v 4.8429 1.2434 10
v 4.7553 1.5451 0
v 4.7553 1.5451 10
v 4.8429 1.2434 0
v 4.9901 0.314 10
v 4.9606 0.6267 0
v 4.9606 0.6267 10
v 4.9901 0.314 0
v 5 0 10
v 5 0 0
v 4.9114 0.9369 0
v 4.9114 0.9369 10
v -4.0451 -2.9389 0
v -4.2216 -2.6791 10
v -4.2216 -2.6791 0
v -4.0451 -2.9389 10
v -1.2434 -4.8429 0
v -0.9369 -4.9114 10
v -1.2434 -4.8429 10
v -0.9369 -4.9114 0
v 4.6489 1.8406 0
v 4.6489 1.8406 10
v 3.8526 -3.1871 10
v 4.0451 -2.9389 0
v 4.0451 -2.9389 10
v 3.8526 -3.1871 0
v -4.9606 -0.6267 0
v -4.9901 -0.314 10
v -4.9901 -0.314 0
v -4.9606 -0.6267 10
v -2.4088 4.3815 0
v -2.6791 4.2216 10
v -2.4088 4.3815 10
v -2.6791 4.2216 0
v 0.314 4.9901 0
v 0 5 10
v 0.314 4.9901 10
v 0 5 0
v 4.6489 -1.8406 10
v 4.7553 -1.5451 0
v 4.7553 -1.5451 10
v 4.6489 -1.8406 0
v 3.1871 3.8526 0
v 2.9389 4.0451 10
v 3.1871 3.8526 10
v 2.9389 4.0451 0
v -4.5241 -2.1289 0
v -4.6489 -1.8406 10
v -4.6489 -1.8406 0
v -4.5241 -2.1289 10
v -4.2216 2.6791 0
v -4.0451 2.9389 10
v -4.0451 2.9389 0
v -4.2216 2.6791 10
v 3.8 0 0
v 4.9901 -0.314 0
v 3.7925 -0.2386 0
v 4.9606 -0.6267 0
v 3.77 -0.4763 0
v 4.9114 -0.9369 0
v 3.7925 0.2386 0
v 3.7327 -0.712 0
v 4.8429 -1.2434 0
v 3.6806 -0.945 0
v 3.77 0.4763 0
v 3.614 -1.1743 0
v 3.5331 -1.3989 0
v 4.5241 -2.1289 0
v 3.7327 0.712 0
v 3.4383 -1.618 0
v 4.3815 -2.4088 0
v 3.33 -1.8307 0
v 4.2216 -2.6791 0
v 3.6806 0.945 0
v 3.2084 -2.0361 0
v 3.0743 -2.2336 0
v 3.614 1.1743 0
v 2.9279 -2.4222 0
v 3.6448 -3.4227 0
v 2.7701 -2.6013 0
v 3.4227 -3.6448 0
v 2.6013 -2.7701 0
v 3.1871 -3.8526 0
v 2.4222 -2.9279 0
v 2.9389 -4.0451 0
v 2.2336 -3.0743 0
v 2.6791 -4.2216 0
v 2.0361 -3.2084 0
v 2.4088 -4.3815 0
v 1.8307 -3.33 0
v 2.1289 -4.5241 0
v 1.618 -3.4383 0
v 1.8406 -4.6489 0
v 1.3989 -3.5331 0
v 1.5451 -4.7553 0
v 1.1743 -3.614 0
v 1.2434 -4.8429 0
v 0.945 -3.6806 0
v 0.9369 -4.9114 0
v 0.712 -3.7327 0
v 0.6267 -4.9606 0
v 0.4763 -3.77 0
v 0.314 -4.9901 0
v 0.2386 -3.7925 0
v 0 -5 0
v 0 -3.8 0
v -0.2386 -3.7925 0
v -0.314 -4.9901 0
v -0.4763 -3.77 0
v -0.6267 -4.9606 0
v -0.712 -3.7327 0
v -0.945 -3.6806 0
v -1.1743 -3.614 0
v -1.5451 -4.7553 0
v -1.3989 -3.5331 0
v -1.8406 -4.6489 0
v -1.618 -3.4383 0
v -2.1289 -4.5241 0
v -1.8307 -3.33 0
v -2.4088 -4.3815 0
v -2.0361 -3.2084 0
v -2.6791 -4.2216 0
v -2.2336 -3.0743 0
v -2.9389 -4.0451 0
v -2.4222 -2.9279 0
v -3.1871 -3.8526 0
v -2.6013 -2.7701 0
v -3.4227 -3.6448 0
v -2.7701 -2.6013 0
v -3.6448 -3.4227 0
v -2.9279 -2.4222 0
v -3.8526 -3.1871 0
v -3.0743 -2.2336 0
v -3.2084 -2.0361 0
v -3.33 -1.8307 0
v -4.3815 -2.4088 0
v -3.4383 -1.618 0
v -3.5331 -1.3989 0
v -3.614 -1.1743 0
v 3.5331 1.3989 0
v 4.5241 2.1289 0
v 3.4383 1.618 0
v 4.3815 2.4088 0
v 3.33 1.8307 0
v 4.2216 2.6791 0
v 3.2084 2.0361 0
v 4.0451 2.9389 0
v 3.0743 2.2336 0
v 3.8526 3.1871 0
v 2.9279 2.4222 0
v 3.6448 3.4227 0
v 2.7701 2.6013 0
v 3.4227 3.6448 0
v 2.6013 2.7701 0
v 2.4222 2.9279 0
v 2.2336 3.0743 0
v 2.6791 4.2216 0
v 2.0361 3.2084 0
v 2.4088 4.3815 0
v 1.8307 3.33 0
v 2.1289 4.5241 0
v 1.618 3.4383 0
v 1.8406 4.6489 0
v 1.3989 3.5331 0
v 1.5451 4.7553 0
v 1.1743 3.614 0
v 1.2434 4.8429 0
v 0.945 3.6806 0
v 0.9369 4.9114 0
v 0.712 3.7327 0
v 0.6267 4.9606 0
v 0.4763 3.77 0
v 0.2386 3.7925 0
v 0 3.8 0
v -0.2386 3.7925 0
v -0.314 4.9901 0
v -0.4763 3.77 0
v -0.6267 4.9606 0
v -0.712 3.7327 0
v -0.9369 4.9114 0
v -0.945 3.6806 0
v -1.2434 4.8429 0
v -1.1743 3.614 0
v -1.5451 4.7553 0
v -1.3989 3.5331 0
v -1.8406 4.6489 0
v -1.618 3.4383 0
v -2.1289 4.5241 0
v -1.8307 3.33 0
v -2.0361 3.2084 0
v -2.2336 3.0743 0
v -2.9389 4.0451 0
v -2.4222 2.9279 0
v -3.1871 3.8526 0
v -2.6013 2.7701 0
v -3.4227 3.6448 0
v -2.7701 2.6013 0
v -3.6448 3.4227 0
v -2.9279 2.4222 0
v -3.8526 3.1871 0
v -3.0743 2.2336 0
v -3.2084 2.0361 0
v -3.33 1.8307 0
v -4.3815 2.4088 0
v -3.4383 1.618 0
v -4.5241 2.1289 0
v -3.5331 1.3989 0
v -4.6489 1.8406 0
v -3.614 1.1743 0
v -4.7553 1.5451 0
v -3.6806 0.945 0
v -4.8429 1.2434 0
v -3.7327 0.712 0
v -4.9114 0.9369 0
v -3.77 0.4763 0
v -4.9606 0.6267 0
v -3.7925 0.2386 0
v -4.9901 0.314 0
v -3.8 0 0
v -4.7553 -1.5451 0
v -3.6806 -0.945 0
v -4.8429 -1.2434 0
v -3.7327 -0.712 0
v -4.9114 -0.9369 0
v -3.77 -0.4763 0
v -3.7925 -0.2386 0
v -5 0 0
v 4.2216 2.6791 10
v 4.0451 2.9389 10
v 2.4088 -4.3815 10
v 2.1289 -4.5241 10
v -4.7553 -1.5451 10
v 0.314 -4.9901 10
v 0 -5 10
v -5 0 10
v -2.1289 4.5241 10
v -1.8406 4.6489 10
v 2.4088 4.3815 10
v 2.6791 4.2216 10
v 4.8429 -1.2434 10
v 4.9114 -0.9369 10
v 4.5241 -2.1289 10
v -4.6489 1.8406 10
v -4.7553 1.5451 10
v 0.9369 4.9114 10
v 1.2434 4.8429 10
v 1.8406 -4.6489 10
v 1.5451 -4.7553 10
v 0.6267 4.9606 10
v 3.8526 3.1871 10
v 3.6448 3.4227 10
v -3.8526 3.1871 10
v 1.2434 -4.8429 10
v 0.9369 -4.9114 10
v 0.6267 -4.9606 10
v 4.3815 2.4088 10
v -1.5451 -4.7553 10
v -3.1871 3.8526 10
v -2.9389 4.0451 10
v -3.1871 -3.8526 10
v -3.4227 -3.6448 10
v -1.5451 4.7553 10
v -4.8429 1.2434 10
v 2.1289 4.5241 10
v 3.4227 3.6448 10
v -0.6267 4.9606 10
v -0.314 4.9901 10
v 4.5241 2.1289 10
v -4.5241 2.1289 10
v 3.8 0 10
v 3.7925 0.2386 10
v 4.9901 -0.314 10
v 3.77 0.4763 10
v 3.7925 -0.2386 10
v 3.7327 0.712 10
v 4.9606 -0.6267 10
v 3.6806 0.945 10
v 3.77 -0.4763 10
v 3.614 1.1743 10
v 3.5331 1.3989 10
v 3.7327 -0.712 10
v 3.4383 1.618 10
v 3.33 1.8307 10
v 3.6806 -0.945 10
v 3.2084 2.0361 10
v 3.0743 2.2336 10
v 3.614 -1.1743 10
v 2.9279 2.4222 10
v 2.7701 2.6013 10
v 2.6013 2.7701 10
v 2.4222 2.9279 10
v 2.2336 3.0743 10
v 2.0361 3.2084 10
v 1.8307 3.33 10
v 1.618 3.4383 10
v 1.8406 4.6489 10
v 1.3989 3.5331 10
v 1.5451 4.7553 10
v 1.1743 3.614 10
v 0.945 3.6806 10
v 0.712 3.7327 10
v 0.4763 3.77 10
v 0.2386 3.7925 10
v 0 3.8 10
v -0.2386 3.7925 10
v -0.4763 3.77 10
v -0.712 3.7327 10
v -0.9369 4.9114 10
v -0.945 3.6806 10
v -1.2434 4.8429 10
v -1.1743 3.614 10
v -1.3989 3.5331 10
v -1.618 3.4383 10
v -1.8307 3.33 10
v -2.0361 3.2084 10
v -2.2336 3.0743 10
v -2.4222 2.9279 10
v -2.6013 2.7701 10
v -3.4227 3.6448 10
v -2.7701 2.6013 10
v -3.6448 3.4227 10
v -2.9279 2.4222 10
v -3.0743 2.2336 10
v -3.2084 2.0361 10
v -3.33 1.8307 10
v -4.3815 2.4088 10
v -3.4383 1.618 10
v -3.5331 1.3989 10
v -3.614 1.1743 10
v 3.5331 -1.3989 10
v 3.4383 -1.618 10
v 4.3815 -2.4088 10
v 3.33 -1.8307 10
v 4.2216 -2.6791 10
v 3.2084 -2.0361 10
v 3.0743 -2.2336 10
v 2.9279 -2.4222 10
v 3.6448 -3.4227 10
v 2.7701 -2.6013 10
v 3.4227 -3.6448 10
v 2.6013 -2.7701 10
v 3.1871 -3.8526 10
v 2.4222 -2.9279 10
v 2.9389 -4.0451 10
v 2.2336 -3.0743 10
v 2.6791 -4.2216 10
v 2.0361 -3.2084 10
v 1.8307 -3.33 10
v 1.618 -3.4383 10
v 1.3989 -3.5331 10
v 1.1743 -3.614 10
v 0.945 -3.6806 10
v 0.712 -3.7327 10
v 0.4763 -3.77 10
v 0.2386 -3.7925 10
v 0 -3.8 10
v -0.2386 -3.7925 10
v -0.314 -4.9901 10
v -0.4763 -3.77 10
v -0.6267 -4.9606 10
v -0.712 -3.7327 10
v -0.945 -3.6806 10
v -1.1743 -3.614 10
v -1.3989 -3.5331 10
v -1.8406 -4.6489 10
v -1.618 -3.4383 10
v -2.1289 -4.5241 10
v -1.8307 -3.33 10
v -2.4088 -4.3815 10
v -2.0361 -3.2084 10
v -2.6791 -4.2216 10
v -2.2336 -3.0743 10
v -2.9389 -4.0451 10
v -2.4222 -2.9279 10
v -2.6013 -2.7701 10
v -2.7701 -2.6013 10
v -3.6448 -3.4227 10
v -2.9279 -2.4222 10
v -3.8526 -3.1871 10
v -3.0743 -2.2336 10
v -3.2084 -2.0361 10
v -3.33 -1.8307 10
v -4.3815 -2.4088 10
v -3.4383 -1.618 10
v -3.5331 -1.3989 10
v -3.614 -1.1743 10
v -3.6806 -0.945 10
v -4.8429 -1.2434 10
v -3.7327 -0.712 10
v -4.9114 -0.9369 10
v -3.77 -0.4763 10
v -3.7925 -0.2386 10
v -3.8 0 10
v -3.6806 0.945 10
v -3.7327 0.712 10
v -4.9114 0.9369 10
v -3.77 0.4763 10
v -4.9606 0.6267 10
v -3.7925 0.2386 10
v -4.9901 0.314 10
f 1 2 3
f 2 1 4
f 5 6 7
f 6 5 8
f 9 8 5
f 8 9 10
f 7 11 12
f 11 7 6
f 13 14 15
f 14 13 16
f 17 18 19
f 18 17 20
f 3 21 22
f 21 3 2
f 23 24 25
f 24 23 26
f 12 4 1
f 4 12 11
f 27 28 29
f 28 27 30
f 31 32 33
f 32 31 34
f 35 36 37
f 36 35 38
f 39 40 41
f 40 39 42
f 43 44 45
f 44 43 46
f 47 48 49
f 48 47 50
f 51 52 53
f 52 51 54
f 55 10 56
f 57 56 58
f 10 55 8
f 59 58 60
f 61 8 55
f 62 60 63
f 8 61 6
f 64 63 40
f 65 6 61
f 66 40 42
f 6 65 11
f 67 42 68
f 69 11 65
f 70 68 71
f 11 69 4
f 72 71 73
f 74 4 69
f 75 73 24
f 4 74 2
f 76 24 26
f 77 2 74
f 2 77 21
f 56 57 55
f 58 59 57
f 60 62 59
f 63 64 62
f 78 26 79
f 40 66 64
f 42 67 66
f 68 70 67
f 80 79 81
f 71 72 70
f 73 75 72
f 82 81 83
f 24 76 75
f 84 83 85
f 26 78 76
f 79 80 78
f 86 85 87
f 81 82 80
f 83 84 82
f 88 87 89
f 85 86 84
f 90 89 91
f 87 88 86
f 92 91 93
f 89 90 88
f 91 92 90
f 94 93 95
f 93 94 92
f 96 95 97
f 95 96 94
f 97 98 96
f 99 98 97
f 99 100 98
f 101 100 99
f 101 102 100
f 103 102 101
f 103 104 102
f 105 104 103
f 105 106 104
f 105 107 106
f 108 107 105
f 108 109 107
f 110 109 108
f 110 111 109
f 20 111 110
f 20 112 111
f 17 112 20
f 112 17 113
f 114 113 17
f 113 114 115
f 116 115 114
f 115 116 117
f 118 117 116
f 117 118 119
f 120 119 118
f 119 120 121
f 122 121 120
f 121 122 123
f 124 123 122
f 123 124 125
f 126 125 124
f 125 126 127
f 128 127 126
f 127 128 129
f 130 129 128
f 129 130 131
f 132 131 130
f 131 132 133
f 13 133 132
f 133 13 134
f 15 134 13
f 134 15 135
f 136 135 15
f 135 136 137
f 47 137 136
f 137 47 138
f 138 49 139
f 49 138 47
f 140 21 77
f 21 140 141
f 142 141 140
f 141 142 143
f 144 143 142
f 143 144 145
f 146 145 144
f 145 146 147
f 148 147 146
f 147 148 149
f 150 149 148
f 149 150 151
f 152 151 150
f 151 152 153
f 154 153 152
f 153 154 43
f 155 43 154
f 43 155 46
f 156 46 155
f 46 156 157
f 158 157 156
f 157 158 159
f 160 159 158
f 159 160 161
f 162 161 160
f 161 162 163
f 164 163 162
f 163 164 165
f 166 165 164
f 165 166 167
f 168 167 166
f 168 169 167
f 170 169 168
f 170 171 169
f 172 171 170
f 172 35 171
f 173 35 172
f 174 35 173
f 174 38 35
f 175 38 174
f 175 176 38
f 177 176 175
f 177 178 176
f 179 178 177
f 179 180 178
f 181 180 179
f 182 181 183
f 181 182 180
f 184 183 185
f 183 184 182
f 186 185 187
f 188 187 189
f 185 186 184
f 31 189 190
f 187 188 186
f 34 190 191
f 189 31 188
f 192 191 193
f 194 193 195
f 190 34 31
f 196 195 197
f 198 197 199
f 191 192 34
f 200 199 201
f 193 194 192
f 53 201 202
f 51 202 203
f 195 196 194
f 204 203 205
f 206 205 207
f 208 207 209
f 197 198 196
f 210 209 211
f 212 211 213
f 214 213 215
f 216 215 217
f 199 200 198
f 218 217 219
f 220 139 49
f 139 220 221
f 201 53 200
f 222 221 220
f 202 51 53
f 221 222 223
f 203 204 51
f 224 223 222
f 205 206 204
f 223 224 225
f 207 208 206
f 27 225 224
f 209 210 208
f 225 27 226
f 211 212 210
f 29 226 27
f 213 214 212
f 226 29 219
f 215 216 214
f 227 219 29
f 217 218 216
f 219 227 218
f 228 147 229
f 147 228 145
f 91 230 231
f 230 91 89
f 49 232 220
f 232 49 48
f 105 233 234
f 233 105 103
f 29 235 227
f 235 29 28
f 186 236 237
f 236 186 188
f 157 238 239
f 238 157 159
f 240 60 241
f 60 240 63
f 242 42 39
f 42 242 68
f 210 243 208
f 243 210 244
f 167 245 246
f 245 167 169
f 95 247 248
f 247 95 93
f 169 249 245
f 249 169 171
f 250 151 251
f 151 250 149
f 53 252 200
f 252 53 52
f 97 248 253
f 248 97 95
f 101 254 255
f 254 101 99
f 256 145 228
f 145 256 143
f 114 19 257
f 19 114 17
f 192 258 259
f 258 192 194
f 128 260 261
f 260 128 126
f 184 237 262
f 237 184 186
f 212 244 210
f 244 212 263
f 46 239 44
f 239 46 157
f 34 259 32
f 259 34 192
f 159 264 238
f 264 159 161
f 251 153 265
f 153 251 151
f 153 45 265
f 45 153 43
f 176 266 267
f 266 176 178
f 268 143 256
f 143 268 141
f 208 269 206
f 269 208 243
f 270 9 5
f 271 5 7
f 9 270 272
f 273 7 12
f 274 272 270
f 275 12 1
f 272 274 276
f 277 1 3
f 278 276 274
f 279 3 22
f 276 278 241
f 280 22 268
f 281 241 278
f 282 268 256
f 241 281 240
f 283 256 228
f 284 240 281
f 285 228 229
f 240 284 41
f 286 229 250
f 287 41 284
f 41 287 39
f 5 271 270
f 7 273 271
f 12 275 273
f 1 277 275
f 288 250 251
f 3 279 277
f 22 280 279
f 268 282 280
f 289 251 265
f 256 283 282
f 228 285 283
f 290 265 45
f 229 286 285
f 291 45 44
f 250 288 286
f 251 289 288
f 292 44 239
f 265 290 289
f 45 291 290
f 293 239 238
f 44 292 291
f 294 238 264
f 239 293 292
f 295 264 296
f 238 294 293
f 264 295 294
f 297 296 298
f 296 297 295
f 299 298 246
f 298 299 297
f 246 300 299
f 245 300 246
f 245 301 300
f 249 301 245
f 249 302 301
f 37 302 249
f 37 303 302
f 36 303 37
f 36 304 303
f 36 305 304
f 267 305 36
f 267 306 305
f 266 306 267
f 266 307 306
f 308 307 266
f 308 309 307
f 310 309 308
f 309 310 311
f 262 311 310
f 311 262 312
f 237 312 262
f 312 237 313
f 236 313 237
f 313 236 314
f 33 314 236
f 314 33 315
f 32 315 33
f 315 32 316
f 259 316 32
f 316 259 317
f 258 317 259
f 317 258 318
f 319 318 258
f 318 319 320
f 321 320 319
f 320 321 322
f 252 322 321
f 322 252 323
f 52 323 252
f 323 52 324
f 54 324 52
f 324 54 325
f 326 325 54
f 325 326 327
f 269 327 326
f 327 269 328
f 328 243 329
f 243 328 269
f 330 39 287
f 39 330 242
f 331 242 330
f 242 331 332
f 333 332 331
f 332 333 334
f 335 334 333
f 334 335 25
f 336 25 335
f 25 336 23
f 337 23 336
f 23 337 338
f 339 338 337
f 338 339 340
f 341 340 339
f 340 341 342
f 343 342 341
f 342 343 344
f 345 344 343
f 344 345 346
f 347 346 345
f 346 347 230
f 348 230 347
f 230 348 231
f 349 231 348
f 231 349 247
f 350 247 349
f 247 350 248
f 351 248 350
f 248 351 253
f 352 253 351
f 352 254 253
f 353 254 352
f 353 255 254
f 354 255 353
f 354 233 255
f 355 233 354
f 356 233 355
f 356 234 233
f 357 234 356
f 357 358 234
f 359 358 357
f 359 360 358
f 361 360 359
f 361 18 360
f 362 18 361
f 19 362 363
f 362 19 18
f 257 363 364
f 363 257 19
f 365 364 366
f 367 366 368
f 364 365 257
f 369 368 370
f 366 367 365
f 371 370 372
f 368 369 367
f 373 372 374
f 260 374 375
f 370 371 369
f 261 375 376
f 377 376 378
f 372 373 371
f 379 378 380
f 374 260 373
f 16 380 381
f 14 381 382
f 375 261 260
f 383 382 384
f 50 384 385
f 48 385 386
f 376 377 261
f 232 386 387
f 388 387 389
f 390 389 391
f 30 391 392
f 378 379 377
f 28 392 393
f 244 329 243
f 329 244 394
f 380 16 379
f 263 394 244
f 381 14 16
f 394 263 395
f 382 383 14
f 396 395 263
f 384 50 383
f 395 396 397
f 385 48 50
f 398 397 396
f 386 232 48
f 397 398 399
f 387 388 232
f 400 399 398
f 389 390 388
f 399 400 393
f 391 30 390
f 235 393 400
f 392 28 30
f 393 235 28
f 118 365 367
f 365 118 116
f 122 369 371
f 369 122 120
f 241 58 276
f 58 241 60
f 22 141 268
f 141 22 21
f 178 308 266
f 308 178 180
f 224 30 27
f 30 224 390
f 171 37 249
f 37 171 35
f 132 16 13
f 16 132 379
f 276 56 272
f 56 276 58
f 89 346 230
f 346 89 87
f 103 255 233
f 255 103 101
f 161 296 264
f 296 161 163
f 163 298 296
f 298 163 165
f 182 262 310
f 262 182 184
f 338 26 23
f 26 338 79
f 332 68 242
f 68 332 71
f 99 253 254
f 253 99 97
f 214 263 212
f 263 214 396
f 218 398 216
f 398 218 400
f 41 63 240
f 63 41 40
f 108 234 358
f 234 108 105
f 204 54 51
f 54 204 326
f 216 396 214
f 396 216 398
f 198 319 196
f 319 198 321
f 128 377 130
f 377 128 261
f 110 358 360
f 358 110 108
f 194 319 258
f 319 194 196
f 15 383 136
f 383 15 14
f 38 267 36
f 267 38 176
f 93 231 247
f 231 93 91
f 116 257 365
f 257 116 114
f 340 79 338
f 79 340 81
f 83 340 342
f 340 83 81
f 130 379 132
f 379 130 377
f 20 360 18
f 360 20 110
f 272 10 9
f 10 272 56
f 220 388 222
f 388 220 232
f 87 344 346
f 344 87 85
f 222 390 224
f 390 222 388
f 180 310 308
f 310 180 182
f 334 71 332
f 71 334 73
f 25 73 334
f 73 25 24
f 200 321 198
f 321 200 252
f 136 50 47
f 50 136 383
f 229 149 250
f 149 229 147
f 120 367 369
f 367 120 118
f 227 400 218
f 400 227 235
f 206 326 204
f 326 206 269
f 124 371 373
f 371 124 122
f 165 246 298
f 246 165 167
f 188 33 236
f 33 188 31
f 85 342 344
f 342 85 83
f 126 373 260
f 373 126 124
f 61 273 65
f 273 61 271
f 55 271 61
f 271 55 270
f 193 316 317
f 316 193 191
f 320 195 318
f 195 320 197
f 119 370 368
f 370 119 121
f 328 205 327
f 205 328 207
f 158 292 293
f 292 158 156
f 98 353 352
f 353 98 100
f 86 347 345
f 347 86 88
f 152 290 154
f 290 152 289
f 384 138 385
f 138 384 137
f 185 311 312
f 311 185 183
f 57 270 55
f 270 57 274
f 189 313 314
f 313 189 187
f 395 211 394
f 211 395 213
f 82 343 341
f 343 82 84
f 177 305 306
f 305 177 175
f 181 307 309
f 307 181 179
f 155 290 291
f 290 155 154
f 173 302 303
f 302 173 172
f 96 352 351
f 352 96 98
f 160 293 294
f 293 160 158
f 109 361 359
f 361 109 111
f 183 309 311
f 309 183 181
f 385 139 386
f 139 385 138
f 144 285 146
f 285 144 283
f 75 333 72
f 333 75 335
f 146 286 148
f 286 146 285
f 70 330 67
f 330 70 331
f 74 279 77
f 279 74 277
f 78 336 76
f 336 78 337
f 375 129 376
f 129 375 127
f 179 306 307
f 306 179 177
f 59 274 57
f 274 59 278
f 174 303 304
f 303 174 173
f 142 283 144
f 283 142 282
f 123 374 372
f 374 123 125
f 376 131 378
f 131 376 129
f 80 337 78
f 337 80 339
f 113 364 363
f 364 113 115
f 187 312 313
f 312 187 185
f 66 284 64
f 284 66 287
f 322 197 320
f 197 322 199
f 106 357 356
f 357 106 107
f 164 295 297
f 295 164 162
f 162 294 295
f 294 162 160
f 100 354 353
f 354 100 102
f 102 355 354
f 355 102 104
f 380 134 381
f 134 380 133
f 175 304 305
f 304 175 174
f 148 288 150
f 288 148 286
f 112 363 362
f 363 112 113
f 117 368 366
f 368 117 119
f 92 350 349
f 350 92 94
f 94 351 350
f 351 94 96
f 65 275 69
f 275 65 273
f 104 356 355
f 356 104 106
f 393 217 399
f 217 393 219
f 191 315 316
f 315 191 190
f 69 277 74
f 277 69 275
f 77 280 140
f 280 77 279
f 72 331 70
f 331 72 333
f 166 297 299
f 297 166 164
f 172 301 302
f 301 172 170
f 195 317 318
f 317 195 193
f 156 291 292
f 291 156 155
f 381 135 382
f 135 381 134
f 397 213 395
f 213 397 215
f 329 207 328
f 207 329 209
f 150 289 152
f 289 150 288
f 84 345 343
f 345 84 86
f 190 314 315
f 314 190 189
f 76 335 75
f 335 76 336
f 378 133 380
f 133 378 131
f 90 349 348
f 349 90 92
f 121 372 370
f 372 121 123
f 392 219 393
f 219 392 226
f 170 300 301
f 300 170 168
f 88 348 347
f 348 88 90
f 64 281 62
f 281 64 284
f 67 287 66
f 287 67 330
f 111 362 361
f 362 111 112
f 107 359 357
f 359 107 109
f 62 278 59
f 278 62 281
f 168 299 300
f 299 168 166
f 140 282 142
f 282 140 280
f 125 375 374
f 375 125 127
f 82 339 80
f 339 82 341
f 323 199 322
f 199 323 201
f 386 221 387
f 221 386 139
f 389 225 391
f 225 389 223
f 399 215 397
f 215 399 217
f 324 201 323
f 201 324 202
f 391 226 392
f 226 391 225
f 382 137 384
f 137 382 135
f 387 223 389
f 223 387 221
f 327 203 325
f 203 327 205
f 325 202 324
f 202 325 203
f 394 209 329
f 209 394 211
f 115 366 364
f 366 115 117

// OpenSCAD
$fn=100;

module cylindar(size) {
  difference() {
    cylinder(h=size, d=size);
    translate([0,0,-1]) cylinder(h=size+2, d=size-(2*1.2));
  }
}

cylindar(10);
